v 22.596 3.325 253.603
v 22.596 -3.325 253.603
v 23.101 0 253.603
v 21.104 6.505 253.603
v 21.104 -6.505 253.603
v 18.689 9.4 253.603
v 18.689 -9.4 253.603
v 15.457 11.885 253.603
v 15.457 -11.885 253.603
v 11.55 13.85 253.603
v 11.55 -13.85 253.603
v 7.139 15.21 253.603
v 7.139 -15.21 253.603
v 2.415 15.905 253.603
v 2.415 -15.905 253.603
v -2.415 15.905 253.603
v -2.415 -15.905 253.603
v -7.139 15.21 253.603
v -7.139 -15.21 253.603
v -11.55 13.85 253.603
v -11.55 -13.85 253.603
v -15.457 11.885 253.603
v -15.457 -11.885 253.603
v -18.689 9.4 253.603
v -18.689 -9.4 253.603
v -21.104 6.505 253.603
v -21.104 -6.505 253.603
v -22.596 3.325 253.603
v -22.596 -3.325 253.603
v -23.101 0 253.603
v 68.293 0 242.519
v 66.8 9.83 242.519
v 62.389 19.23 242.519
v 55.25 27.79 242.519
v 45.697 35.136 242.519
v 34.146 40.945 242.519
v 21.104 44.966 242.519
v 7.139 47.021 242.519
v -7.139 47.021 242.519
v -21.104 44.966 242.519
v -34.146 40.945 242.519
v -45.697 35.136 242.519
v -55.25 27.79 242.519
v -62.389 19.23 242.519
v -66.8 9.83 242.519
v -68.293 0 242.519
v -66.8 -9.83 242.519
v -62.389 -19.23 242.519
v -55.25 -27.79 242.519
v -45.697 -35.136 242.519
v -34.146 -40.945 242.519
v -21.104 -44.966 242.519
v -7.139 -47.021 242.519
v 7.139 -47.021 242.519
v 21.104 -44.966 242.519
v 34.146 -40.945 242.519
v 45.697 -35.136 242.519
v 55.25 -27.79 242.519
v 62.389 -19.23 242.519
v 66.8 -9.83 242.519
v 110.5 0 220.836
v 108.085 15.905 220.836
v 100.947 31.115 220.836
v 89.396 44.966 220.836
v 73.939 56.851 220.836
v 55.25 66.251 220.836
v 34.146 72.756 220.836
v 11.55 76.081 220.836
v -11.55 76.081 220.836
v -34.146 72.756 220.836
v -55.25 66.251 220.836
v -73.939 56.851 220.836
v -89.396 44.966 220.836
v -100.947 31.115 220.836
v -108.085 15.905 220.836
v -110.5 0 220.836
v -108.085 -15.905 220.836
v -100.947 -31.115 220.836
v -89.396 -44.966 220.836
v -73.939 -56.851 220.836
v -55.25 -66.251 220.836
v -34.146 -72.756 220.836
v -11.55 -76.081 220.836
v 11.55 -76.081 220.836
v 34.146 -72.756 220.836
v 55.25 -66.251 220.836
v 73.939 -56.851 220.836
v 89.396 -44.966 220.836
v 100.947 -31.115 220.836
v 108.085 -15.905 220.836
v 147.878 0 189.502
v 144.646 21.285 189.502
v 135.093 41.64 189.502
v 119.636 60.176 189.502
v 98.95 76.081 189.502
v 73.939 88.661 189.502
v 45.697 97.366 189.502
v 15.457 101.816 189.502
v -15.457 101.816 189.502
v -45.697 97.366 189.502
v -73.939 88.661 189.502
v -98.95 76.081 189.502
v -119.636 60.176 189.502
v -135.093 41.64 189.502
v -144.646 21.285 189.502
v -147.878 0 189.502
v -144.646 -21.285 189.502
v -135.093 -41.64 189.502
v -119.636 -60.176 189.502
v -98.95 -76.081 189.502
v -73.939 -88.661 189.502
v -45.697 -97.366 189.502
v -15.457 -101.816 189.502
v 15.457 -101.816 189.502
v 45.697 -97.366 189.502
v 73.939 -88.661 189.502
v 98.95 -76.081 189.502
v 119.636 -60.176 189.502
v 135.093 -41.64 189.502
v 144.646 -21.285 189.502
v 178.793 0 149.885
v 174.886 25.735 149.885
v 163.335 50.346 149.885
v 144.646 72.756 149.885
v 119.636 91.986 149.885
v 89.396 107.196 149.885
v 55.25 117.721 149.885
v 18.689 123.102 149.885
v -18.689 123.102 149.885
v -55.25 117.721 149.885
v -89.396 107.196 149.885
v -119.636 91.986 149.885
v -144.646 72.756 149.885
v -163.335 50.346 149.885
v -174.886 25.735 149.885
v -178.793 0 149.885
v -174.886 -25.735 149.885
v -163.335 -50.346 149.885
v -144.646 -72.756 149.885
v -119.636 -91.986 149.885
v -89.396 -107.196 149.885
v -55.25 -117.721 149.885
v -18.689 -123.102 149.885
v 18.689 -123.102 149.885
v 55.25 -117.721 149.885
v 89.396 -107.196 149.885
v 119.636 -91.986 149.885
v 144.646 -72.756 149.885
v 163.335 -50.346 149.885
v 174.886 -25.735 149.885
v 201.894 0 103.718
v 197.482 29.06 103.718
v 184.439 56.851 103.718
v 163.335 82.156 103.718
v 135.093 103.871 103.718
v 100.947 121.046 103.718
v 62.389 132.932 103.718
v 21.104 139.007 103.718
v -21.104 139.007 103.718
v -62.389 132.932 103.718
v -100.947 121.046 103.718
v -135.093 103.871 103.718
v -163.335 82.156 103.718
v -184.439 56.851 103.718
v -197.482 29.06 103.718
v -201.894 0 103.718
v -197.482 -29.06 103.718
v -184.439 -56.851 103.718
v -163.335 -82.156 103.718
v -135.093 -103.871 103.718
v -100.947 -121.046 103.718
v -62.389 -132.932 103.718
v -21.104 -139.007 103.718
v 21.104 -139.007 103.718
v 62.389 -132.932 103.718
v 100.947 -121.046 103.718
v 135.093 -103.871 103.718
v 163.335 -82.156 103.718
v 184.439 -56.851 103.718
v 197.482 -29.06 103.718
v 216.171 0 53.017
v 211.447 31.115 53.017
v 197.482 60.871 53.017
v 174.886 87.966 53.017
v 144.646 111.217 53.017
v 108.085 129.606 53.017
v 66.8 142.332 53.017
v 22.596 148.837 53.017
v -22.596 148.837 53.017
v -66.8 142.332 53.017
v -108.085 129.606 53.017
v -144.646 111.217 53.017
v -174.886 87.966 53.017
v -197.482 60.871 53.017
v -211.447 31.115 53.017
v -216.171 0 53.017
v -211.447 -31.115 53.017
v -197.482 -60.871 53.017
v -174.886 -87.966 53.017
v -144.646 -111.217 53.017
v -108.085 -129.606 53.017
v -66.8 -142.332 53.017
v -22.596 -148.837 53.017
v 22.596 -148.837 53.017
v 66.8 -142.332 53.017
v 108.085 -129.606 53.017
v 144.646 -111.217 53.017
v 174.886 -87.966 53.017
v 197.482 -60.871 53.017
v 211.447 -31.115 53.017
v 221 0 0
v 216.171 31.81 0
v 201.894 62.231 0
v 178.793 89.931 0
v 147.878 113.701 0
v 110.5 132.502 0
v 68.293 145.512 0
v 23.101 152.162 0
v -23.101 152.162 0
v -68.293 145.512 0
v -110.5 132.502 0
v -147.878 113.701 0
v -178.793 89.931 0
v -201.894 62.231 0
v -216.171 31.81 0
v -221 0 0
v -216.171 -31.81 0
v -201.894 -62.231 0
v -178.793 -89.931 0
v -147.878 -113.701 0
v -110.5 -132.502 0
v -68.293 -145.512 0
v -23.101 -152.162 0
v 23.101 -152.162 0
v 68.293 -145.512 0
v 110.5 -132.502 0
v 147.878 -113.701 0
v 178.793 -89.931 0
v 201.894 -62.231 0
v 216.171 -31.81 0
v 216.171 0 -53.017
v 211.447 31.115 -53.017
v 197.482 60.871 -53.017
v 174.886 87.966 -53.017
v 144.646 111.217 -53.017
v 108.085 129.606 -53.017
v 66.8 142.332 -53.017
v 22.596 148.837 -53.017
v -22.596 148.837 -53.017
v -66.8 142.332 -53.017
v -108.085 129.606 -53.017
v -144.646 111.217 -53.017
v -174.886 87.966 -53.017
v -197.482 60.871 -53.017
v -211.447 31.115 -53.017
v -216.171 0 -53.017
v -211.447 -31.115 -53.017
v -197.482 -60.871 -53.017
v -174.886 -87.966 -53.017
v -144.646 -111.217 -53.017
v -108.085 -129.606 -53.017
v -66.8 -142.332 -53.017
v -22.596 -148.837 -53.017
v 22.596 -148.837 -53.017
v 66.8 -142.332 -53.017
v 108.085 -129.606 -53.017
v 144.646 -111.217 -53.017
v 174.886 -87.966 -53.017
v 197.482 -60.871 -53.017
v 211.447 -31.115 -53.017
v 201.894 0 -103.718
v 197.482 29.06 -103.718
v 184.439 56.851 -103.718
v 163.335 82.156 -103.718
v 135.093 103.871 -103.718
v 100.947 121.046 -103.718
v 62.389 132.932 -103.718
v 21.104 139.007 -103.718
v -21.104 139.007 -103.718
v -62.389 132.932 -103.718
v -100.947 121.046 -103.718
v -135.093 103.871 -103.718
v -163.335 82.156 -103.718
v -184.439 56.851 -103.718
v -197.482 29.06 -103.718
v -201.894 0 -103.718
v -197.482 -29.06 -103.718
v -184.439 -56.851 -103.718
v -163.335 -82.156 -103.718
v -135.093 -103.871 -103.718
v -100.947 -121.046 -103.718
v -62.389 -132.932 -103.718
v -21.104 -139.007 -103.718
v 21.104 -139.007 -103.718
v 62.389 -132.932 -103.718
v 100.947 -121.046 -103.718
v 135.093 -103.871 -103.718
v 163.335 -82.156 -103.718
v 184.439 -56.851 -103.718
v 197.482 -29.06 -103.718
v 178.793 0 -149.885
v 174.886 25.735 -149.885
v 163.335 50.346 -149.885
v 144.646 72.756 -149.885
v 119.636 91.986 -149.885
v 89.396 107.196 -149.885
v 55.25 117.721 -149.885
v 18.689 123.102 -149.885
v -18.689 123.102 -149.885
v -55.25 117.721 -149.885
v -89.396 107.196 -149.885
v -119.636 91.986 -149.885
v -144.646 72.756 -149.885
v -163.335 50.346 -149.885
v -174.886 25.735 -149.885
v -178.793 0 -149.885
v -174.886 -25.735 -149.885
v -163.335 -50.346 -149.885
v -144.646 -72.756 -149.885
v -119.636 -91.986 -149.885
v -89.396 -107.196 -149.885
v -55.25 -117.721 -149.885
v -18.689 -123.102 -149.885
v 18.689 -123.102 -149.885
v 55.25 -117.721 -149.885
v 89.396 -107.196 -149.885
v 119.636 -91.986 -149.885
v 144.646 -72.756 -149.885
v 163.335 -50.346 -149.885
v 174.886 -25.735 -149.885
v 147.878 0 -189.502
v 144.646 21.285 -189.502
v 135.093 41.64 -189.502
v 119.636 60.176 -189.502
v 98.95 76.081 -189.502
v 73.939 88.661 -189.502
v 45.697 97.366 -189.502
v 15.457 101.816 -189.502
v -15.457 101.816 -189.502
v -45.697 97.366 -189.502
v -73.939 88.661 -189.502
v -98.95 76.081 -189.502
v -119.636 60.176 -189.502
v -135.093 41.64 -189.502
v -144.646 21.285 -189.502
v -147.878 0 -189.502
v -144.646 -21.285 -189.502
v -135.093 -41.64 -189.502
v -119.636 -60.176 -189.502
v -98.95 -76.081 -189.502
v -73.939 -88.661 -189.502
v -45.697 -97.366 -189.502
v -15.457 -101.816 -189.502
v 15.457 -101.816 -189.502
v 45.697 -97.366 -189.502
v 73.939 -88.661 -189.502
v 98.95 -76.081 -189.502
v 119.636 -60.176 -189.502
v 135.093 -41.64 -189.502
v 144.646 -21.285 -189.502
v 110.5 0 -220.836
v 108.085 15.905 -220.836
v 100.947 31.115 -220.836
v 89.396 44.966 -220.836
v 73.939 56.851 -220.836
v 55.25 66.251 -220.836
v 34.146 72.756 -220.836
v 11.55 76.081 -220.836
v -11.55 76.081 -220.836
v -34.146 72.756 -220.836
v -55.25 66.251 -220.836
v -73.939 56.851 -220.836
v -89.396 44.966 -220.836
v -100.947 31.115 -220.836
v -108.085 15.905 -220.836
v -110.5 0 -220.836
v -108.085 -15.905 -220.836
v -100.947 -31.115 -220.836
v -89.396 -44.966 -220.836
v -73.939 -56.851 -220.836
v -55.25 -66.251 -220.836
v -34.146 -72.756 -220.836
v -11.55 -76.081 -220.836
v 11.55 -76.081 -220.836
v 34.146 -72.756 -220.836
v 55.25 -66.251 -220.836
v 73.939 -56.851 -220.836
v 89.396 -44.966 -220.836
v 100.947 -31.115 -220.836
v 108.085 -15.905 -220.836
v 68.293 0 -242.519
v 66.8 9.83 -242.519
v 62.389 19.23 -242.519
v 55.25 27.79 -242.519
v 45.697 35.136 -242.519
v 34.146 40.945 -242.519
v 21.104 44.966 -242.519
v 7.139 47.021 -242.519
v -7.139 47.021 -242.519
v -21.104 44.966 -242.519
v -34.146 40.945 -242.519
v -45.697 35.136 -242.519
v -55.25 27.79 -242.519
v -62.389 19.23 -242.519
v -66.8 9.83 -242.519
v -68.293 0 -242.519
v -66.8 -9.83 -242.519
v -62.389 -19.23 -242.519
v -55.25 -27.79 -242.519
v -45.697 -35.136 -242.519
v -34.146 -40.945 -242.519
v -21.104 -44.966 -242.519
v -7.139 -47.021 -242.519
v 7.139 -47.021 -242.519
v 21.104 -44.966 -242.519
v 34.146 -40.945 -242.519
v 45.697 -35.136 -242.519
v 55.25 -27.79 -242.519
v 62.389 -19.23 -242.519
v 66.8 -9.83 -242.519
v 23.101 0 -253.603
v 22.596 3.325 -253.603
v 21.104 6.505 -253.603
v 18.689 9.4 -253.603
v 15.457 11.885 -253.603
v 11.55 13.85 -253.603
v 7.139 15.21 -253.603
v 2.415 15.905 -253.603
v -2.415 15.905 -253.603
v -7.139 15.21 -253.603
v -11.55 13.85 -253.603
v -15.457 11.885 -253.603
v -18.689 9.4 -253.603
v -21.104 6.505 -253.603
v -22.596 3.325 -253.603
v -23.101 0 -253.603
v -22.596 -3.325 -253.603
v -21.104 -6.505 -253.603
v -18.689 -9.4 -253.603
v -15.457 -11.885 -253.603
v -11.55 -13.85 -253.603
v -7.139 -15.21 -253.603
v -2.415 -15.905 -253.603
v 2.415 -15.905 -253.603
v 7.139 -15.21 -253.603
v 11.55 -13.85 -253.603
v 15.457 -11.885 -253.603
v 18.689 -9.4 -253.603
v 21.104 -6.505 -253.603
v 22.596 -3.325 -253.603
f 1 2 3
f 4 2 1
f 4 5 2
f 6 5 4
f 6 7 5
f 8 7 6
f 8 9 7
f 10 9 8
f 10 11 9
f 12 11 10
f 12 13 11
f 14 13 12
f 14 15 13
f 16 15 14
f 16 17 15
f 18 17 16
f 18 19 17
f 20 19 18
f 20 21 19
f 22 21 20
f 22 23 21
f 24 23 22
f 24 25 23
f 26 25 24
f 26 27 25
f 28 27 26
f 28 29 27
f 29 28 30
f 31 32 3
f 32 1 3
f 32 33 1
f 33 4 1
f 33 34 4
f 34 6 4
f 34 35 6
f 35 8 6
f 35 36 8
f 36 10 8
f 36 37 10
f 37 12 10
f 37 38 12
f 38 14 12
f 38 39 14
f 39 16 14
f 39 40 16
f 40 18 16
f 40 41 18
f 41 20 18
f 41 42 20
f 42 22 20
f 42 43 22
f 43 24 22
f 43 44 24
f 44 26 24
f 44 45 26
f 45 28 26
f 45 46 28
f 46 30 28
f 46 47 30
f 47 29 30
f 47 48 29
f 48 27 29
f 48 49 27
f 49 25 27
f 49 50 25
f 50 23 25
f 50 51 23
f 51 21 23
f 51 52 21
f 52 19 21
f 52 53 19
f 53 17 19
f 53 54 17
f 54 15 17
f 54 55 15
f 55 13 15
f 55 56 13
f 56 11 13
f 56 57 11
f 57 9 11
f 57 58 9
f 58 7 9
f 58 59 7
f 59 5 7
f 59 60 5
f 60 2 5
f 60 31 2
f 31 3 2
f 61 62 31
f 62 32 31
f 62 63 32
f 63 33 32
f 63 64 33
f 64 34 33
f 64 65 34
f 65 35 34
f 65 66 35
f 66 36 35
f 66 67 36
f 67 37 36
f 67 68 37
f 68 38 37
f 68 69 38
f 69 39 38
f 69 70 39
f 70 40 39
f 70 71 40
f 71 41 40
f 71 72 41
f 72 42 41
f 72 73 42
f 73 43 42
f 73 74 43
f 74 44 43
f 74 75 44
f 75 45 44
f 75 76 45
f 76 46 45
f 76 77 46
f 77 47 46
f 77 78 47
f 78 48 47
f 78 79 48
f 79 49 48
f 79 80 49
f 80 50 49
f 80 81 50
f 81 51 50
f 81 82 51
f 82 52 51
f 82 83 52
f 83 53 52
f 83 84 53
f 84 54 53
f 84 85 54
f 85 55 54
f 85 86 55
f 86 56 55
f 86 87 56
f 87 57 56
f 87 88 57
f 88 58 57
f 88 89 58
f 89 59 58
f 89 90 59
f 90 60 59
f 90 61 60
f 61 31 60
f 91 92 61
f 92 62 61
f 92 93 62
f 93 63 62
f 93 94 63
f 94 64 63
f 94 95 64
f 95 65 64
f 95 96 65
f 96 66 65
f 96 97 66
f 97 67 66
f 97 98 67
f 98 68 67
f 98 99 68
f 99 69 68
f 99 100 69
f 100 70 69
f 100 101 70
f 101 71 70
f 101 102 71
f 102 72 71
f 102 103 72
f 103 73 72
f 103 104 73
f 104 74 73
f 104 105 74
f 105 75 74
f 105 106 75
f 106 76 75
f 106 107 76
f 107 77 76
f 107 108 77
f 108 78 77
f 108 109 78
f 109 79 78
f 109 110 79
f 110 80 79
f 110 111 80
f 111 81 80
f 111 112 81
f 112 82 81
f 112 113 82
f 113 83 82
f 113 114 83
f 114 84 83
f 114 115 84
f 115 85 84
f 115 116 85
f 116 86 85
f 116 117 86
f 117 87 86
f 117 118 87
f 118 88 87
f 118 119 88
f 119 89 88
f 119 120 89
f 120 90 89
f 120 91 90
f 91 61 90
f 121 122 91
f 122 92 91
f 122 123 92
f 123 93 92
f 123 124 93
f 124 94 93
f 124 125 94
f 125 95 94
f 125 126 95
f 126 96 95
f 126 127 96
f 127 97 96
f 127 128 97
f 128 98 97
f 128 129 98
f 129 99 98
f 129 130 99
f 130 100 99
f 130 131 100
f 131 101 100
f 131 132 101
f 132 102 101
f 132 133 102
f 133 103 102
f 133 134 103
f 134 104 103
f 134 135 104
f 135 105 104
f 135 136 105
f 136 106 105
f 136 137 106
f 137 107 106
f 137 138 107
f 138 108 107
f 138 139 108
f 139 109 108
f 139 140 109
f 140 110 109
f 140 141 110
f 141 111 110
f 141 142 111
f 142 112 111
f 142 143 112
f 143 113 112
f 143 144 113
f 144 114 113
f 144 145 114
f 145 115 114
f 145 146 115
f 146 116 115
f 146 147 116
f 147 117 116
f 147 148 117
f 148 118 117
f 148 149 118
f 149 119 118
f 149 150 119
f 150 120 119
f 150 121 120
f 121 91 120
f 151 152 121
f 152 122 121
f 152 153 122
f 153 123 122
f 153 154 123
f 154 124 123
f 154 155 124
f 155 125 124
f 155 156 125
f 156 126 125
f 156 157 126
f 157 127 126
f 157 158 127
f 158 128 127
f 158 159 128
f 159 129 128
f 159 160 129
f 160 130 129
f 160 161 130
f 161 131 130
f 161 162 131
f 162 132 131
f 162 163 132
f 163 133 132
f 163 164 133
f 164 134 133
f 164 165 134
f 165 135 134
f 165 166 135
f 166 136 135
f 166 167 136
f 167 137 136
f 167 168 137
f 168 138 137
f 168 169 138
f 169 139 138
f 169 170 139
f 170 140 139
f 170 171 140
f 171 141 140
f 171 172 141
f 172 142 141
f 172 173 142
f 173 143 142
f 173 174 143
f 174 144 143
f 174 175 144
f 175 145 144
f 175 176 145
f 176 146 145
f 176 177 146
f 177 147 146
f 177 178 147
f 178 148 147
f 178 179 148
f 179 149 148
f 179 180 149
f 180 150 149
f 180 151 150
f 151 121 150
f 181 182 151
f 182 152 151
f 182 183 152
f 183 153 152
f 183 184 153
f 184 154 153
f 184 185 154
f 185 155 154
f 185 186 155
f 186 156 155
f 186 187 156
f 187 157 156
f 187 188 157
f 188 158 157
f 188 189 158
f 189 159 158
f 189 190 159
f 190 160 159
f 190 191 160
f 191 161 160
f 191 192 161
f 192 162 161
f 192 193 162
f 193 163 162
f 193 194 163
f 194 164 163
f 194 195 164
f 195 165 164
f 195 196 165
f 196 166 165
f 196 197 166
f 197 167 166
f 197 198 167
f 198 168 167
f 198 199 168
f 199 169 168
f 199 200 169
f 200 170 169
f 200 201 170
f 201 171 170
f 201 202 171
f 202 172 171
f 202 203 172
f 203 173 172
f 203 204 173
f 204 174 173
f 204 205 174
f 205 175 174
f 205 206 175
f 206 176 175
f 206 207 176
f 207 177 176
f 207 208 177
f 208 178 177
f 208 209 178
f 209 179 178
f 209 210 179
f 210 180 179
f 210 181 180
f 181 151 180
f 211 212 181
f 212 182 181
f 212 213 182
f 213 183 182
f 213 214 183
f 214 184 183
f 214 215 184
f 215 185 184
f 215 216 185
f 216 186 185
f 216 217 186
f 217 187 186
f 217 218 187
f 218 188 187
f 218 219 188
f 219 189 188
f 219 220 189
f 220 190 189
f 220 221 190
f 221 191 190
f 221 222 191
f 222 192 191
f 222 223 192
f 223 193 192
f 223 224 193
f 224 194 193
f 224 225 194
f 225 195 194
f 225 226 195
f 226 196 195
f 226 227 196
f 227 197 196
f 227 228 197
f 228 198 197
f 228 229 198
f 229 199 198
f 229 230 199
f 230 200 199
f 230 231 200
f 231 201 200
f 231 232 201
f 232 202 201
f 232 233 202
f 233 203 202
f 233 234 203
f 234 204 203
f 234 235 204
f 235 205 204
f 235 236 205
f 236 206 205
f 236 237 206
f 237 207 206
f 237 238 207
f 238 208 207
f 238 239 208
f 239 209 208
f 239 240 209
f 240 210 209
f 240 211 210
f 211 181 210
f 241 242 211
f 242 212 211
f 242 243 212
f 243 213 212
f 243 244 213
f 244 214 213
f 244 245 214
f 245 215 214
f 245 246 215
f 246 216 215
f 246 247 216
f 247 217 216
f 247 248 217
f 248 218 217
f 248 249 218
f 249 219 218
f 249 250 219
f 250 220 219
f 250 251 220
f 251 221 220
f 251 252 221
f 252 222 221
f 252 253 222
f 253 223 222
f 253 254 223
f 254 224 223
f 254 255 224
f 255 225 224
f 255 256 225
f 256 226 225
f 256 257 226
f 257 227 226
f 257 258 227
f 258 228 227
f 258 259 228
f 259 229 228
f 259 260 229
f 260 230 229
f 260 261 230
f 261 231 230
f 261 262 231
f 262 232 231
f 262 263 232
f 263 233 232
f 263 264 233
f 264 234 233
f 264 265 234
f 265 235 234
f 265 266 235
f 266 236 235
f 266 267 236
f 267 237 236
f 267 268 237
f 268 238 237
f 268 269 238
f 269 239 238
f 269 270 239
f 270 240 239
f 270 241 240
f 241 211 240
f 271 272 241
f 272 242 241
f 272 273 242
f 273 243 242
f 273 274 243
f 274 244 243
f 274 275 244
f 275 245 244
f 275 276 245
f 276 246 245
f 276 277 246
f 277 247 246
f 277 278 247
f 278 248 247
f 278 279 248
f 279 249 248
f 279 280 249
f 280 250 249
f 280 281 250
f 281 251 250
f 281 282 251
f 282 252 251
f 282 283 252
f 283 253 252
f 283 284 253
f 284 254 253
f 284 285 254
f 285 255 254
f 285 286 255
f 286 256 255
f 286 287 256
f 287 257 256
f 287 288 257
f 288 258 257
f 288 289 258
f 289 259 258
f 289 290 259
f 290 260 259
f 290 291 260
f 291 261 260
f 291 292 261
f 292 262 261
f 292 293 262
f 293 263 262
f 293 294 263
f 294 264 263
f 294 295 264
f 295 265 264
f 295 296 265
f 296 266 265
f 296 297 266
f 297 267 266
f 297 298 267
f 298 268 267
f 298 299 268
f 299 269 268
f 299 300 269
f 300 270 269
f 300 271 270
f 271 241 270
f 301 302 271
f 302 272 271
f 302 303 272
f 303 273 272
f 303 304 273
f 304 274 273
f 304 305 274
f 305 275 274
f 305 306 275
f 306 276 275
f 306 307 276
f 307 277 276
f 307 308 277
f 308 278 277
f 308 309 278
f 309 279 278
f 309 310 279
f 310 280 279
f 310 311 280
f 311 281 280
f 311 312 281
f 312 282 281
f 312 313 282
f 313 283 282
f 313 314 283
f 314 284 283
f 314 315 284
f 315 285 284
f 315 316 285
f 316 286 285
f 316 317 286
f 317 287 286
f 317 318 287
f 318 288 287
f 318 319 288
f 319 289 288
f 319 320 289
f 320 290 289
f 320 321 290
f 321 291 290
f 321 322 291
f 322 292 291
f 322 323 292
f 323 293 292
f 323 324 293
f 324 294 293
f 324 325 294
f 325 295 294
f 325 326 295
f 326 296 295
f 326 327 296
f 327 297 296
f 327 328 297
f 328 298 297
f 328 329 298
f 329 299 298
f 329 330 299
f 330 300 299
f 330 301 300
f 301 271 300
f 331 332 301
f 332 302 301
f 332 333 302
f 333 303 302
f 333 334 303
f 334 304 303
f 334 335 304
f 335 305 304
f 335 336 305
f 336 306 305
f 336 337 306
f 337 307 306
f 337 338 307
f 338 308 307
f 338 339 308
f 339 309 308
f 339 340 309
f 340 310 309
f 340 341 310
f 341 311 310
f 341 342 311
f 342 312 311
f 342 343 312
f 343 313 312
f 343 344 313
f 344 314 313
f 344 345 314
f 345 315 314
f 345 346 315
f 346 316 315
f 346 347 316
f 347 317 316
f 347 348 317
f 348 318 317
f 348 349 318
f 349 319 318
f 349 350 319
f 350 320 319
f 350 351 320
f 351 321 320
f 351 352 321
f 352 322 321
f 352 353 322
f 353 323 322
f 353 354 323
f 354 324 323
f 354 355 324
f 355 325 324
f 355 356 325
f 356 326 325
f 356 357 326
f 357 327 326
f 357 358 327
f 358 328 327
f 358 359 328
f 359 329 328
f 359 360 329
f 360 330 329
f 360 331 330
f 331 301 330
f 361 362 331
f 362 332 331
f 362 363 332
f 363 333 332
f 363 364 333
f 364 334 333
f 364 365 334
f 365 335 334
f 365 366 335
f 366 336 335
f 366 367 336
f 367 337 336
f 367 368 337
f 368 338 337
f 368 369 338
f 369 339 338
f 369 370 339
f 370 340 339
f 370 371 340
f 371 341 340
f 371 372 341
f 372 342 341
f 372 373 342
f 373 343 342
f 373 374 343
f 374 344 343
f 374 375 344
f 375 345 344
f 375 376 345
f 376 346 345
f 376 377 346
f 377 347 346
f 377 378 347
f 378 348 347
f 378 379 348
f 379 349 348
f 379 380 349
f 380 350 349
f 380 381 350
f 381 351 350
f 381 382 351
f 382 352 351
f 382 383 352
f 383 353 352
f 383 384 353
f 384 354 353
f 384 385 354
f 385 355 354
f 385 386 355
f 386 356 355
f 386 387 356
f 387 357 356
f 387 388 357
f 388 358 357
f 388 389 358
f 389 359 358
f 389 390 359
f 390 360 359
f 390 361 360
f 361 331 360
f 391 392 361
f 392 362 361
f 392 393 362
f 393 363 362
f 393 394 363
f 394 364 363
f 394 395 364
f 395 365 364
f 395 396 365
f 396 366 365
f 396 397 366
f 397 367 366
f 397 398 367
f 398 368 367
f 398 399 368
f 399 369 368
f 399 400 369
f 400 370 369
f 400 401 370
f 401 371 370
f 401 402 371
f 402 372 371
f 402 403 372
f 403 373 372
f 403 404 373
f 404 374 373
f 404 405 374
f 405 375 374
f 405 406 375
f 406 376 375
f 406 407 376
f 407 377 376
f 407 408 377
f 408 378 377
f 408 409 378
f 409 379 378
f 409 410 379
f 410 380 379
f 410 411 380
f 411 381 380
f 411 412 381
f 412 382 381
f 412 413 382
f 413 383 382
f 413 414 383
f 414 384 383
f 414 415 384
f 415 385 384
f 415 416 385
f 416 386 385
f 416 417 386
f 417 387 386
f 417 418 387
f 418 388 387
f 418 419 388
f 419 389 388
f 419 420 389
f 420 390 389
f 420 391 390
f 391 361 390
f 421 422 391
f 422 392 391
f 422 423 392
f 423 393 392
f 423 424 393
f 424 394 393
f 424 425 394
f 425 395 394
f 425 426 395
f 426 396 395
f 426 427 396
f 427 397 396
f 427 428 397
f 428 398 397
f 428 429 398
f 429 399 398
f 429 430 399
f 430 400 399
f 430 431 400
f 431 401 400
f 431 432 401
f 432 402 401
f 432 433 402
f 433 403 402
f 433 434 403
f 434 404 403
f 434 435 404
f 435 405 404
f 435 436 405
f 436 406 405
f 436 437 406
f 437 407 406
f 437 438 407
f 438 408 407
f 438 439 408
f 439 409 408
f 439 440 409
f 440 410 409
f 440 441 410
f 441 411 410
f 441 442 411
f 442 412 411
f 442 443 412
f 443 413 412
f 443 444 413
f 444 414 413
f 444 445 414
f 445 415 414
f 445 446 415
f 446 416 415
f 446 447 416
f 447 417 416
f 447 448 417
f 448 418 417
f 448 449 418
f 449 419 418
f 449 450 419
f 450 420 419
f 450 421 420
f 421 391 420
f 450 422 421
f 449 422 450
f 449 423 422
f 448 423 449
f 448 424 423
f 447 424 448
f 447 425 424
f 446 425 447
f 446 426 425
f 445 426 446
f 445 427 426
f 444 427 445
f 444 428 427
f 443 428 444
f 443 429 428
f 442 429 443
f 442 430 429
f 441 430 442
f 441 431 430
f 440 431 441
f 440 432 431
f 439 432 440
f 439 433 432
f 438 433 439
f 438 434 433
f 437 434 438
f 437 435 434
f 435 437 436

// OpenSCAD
// Generated by SolidPython 1.0.1 on 2020-07-29 00:46:50


scale(v = [13, 9, 15]) {
	sphere(r = 17);
}
/***********************************************
*********      SolidPython code:      **********
************************************************
 
# import packages: SolidPython
from solid import *
from solid.utils import *
from itertools import chain, combinations, permutations


class Resize:

    def __init__(self, scad_file):
        self.scad_file = scad_file
        #self.scad_file = import_scad(scad_file)
        # cone/cylinder param:
        self.r1 = 0
        self.r2 = 0
        self.h = 0
        # rectangular prism param:
        self.w = 0
        self.l = 0
        # ellipse param:
        self.r = 0

    # import OpenScad code (file name corresponds to shape)


    # classify shape + parameters
    def assign(self, param1, param2, param3):
        if self.scad_file == 'cone.scad':
            self.r1 = param1
            self.r2 = param2
            self.h = param3
        elif self.scad_file == 'cylinder.scad':
            self.r1 = param1
            self.r2 = param2
            self.h = param3
        elif self.scad_file == 'rectangularPrism.scad':
            self.h = param1
            self.l = param2
            self.w = param3
        else:
            self.r = param1
            self.h = param2

    # resize parameters
    def iterate(self):
        x = range(3, 20, 2)
        i = 1
        if self.scad_file == 'cone.scad':
            tempList = list(permutations(x, 2))
            for temp in tempList:
                param1 = temp[0]
                param2 = temp[1]
                filepath = 'produced_scad_files/' + 'cone' + str(param1) + '_' + str(param2) + '_' + '.scad'
                scad_render_to_file(cylinder(h=param1, r1=param2, r2=0), filepath)

        elif self.scad_file == 'cylinder.scad':
            tempList = list(permutations(x, 3))
            for temp in tempList:
                param1 = temp[0]
                param2 = temp[1]
                filepath = 'produced_scad_files/' + 'cylinder' + str(param1) + '_' + str(param2) + '_' + '.scad'
                scad_render_to_file(cylinder(h=param1, r1=param2, r2=param2), filepath)

        elif self.scad_file == 'rectangularPrism.scad':
            tempList = list(permutations(x, 3))
            for temp in tempList:
                param1 = temp[0]
                param2 = temp[1]
                param3 = temp[2]
                filepath = 'produced_scad_files/' + 'rectangularPrism' + str(param1) + '_' + str(param2) + '_' + str(
                    param3) + '.scad'
                scad_render_to_file(cube(size=(param1, param2, param3)), filepath)

        elif self.scad_file == 'ellipse.scad':
            tempList = list(permutations(x, 4))
            for temp in tempList:
                param1 = temp[0]
                param2 = temp[1]
                param3 = temp[2]
                param4 = temp[3]
                filepath = 'produced_scad_files/' + 'ellipse' + str(param1) + '_' + str(param2) + '_' + str(param3) + '_' + str(param4) + '.scad'
                scad_render_to_file(scale([param1, param2, param3])(sphere(r=param4)), filepath)

    def render_to_scadfile(self):
        scad_render_to_file(scad, 'example.scad') 
 
************************************************/
